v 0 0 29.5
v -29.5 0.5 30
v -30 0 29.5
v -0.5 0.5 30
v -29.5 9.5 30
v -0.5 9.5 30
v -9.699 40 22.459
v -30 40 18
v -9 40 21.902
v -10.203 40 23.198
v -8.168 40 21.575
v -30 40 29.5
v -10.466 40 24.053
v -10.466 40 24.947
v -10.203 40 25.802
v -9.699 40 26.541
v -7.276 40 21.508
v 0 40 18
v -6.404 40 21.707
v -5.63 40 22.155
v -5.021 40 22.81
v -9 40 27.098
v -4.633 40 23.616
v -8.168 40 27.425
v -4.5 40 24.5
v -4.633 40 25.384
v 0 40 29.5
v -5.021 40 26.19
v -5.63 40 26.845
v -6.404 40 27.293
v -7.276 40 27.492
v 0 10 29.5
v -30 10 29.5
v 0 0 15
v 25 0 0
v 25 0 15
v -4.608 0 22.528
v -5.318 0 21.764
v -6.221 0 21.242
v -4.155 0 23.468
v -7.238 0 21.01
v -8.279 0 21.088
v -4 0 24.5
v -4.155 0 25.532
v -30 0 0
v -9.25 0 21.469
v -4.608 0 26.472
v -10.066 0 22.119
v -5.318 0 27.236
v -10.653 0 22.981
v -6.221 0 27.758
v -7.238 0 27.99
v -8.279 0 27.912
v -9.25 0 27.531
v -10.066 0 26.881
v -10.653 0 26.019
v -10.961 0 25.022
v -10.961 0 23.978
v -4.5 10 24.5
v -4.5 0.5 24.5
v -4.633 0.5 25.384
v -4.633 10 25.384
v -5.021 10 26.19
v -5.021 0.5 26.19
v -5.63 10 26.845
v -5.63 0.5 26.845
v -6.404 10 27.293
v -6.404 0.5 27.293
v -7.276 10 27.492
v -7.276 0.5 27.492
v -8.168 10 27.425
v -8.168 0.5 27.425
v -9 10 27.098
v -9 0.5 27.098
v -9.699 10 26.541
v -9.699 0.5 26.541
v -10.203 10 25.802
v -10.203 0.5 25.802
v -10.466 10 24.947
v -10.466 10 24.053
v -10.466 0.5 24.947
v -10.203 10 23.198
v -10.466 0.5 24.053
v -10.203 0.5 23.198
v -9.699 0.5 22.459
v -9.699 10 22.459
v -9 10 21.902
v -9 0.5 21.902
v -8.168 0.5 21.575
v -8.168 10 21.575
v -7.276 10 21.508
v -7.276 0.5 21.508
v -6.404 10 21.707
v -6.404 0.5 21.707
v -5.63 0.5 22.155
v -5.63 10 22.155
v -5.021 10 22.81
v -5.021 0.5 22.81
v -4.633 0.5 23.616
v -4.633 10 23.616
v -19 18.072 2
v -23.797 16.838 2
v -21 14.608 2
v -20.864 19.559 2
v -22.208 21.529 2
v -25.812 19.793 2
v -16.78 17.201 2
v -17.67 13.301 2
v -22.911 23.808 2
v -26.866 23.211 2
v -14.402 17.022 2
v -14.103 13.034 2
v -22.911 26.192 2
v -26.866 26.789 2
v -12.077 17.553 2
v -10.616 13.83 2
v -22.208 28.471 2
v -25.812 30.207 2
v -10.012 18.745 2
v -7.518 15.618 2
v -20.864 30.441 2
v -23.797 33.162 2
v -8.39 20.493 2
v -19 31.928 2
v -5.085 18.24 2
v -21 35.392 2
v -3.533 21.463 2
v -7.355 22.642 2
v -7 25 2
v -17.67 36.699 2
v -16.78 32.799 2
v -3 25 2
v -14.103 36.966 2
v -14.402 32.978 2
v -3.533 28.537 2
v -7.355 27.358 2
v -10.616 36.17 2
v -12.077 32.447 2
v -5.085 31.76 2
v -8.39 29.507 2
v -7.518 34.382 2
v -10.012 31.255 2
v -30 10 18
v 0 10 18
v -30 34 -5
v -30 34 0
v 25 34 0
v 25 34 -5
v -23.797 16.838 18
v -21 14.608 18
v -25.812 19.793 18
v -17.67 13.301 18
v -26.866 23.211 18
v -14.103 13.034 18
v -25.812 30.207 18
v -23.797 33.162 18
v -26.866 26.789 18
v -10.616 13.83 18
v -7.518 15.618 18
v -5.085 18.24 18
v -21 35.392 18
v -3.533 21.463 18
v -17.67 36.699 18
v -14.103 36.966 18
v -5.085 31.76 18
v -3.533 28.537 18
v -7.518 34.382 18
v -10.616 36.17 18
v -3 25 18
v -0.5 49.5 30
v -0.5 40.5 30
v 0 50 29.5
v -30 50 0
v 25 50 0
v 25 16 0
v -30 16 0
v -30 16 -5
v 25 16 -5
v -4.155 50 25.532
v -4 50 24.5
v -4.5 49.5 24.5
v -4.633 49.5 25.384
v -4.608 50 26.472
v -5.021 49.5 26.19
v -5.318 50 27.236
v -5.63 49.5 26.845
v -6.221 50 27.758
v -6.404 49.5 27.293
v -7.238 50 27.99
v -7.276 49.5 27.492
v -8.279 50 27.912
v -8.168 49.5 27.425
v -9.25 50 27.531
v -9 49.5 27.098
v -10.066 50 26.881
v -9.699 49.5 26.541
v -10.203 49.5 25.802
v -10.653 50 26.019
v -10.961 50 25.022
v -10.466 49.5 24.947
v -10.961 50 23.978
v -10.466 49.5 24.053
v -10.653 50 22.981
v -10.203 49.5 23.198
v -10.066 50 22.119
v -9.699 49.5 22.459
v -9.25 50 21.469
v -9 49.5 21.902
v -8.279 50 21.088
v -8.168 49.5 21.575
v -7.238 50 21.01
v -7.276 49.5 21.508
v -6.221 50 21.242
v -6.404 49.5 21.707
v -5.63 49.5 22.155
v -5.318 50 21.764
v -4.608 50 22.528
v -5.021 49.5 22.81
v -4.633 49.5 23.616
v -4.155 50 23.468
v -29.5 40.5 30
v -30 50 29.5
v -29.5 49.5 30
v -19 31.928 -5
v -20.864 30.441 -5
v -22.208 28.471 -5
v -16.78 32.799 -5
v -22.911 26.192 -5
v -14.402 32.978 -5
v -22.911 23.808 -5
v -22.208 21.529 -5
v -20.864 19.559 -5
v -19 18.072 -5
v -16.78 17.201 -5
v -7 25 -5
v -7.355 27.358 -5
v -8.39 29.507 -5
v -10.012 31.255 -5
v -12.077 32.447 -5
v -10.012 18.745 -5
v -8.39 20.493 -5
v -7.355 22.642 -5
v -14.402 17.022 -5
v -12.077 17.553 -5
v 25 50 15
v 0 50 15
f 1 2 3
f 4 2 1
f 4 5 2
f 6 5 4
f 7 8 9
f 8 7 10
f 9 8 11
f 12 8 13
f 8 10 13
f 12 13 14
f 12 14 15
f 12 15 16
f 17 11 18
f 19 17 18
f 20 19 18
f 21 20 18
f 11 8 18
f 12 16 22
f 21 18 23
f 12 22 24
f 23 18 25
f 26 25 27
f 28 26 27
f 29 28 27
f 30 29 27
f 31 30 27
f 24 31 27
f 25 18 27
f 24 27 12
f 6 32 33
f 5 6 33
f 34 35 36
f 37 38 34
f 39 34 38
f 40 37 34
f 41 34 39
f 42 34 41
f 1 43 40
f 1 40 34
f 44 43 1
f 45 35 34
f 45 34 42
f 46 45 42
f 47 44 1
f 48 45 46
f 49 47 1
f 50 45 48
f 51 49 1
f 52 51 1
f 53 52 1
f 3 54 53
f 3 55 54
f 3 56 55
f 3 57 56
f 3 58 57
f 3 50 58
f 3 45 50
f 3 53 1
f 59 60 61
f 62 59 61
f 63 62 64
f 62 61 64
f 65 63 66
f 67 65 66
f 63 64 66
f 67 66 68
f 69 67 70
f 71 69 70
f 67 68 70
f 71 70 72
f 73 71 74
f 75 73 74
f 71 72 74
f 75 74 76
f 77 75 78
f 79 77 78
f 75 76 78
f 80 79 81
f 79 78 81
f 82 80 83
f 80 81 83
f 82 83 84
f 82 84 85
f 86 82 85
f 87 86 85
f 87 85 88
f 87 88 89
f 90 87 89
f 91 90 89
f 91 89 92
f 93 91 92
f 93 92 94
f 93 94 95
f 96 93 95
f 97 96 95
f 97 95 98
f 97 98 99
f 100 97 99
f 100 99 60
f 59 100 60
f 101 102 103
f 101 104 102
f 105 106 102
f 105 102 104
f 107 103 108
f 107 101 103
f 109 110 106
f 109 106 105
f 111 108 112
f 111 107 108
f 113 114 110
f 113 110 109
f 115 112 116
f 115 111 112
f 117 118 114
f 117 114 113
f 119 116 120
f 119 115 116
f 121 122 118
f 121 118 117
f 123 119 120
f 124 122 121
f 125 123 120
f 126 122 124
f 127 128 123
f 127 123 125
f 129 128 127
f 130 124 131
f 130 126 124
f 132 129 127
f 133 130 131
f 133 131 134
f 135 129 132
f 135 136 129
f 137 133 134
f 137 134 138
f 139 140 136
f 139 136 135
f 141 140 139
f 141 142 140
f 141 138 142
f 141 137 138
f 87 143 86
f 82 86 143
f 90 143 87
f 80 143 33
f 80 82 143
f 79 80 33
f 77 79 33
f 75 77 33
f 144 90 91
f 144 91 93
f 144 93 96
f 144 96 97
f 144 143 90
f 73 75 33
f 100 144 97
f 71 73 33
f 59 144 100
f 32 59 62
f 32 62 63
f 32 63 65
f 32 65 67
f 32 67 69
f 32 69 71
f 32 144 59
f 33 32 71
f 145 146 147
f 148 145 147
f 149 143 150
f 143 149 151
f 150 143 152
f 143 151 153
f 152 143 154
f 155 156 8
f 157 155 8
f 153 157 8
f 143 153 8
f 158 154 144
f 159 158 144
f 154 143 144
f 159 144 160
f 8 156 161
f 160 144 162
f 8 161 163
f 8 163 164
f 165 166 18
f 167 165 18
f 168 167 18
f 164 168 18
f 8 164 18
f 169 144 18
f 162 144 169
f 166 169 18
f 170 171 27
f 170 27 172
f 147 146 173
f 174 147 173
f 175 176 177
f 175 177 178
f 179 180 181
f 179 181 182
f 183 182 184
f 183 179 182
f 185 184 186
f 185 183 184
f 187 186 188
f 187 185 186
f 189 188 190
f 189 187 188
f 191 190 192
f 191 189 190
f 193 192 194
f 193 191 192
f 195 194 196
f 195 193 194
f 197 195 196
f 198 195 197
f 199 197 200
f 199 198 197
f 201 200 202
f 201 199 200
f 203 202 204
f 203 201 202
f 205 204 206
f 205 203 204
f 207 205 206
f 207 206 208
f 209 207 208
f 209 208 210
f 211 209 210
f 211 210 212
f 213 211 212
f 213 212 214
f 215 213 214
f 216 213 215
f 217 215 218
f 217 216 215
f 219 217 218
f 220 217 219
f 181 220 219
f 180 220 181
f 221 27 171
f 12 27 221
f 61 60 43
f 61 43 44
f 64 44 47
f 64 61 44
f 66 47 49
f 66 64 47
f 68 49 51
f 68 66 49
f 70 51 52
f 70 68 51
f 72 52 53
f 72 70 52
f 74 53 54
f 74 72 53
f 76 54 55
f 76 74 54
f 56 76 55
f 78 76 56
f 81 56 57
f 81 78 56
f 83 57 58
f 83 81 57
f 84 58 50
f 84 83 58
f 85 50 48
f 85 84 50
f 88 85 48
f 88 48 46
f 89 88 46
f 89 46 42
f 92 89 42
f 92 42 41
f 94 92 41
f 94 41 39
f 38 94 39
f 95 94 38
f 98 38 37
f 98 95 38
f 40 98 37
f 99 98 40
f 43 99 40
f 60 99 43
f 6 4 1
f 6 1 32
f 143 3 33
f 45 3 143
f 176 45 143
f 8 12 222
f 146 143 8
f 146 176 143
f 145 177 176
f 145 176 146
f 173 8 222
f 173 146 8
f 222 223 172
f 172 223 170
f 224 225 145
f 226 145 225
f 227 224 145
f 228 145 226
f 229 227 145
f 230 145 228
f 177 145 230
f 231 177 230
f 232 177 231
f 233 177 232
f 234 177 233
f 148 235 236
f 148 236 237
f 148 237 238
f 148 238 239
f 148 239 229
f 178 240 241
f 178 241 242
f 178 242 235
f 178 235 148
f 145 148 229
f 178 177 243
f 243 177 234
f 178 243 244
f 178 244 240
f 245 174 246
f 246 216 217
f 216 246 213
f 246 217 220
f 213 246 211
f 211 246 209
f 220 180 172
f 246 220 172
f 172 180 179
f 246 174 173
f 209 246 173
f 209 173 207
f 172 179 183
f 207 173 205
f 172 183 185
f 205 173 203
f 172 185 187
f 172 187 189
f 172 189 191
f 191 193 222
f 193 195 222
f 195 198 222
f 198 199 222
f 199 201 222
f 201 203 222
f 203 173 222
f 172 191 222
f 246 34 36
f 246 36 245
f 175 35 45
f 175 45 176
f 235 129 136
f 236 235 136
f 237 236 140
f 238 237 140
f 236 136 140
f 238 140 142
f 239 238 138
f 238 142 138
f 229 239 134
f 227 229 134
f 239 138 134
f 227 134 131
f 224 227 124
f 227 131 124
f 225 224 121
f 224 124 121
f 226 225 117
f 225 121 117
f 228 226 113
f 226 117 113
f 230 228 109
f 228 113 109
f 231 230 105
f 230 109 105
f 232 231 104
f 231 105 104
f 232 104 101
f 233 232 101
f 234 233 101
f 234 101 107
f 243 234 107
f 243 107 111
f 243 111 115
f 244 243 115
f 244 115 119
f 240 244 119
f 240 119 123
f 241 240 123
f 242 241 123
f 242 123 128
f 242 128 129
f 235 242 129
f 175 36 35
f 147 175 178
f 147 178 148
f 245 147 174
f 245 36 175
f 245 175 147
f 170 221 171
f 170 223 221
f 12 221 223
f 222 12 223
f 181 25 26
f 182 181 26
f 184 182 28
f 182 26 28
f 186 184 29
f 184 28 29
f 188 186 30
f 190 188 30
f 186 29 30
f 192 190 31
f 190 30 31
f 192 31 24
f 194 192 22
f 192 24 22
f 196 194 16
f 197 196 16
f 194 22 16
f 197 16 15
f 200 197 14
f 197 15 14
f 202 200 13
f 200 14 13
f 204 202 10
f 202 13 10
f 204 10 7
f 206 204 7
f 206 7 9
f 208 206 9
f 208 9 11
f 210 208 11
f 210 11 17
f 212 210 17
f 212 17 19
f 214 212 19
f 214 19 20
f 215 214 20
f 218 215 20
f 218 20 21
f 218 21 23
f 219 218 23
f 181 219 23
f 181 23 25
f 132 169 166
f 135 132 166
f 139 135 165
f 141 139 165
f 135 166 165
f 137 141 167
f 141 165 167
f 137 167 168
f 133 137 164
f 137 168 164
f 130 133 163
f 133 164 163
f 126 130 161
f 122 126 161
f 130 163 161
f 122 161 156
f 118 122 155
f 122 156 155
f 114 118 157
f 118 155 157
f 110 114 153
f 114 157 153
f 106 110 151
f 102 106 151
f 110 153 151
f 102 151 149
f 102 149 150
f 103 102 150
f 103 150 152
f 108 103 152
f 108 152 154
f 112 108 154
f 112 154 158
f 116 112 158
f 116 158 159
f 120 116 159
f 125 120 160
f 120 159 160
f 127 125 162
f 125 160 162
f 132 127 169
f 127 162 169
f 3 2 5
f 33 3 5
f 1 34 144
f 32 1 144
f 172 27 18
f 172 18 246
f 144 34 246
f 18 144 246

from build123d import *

# Parameters (mm, degrees)
F0_W           = 30
F0_H           = 50
F1_DEPTH       = 30
F2_W           = 50
F2_H           = 15
F3_DEPTH       = 25
F5_W           = 55
F5_H           = 18
F6_DEPTH       = 5
F4_R           = 3
F7_DEPTH       = 50.001
F8_SIZE        = 0.5
F9_W           = 30
F9_H           = 12
F10_DEPTH      = 30.001
F11_R          = 12
F12_DEPTH      = 12.001
F12_DEPTH_BACK = 16
F13_SIZE       = 0.5
F14_R          = 8
F15_DEPTH      = 7.001


with BuildPart() as f1:
    # F0 (on Top) → F1 (new body)
    with BuildSketch(Plane.XY):
        with Locations((-15, 25)):
            Rectangle(F0_W, F0_H)
    extrude(amount=F1_DEPTH)

    # F2 (on face) → F3 (join)
    with BuildSketch(Plane.YZ):
        with Locations((25, 7.5)):
            Rectangle(F2_W, F2_H)
    extrude(amount=F3_DEPTH)

    # F5 (on face) → F6 (join)
    with BuildSketch(Plane(origin=(0, 0, 0), x_dir=(1, 0, 0), z_dir=(0, 0, -1))):
        with Locations((-2.5, -25)):
            Rectangle(F5_W, F5_H)
    extrude(amount=F6_DEPTH)

    # F4 (on face) → F7 (cut, through all)
    with BuildSketch(Plane.XZ):
        with Locations((-7.5, 24.5)):
            Circle(F4_R)
    extrude(amount=-F7_DEPTH, mode=Mode.SUBTRACT)

    # F8
    f8_edges = [f1.edges().sort_by_distance(p)[0] for p in [
        (-10.5, 0, 24.5),
        (-10.5, 50, 24.5),
    ]]
    chamfer(f8_edges, length=F8_SIZE)

    # F9 (on face) → F10 (cut, through all)
    with BuildSketch(Plane.YZ):
        with Locations((25, 24)):
            Rectangle(F9_W, F9_H)
    extrude(amount=-F10_DEPTH, mode=Mode.SUBTRACT)

    # F11 (on face) → F12 (cut, two sides)
    with BuildSketch(Plane.XY.offset(18)) as f12_sk:
        with Locations((-15, 25)):
            Circle(F11_R)
    extrude(amount=F12_DEPTH, mode=Mode.SUBTRACT)
    extrude(f12_sk.sketch, amount=-F12_DEPTH_BACK, mode=Mode.SUBTRACT)

    # F13
    f13_edges = [f1.edges().sort_by_distance(p)[0] for p in [
        (-30, 5, 30),
        (-15, 10, 30),
        (0, 5, 30),
        (-15, 0, 30),
        (-15, 40, 30),
        (-30, 45, 30),
        (-15, 50, 30),
        (0, 45, 30),
    ]]
    chamfer(f13_edges, length=F13_SIZE)

    # F14 (on face) → F15 (cut, through all)
    with BuildSketch(Plane.XY.offset(2)):
        with Locations((-15, 25)):
            Circle(F14_R)
    extrude(amount=-F15_DEPTH, mode=Mode.SUBTRACT)


solid = f1.part
